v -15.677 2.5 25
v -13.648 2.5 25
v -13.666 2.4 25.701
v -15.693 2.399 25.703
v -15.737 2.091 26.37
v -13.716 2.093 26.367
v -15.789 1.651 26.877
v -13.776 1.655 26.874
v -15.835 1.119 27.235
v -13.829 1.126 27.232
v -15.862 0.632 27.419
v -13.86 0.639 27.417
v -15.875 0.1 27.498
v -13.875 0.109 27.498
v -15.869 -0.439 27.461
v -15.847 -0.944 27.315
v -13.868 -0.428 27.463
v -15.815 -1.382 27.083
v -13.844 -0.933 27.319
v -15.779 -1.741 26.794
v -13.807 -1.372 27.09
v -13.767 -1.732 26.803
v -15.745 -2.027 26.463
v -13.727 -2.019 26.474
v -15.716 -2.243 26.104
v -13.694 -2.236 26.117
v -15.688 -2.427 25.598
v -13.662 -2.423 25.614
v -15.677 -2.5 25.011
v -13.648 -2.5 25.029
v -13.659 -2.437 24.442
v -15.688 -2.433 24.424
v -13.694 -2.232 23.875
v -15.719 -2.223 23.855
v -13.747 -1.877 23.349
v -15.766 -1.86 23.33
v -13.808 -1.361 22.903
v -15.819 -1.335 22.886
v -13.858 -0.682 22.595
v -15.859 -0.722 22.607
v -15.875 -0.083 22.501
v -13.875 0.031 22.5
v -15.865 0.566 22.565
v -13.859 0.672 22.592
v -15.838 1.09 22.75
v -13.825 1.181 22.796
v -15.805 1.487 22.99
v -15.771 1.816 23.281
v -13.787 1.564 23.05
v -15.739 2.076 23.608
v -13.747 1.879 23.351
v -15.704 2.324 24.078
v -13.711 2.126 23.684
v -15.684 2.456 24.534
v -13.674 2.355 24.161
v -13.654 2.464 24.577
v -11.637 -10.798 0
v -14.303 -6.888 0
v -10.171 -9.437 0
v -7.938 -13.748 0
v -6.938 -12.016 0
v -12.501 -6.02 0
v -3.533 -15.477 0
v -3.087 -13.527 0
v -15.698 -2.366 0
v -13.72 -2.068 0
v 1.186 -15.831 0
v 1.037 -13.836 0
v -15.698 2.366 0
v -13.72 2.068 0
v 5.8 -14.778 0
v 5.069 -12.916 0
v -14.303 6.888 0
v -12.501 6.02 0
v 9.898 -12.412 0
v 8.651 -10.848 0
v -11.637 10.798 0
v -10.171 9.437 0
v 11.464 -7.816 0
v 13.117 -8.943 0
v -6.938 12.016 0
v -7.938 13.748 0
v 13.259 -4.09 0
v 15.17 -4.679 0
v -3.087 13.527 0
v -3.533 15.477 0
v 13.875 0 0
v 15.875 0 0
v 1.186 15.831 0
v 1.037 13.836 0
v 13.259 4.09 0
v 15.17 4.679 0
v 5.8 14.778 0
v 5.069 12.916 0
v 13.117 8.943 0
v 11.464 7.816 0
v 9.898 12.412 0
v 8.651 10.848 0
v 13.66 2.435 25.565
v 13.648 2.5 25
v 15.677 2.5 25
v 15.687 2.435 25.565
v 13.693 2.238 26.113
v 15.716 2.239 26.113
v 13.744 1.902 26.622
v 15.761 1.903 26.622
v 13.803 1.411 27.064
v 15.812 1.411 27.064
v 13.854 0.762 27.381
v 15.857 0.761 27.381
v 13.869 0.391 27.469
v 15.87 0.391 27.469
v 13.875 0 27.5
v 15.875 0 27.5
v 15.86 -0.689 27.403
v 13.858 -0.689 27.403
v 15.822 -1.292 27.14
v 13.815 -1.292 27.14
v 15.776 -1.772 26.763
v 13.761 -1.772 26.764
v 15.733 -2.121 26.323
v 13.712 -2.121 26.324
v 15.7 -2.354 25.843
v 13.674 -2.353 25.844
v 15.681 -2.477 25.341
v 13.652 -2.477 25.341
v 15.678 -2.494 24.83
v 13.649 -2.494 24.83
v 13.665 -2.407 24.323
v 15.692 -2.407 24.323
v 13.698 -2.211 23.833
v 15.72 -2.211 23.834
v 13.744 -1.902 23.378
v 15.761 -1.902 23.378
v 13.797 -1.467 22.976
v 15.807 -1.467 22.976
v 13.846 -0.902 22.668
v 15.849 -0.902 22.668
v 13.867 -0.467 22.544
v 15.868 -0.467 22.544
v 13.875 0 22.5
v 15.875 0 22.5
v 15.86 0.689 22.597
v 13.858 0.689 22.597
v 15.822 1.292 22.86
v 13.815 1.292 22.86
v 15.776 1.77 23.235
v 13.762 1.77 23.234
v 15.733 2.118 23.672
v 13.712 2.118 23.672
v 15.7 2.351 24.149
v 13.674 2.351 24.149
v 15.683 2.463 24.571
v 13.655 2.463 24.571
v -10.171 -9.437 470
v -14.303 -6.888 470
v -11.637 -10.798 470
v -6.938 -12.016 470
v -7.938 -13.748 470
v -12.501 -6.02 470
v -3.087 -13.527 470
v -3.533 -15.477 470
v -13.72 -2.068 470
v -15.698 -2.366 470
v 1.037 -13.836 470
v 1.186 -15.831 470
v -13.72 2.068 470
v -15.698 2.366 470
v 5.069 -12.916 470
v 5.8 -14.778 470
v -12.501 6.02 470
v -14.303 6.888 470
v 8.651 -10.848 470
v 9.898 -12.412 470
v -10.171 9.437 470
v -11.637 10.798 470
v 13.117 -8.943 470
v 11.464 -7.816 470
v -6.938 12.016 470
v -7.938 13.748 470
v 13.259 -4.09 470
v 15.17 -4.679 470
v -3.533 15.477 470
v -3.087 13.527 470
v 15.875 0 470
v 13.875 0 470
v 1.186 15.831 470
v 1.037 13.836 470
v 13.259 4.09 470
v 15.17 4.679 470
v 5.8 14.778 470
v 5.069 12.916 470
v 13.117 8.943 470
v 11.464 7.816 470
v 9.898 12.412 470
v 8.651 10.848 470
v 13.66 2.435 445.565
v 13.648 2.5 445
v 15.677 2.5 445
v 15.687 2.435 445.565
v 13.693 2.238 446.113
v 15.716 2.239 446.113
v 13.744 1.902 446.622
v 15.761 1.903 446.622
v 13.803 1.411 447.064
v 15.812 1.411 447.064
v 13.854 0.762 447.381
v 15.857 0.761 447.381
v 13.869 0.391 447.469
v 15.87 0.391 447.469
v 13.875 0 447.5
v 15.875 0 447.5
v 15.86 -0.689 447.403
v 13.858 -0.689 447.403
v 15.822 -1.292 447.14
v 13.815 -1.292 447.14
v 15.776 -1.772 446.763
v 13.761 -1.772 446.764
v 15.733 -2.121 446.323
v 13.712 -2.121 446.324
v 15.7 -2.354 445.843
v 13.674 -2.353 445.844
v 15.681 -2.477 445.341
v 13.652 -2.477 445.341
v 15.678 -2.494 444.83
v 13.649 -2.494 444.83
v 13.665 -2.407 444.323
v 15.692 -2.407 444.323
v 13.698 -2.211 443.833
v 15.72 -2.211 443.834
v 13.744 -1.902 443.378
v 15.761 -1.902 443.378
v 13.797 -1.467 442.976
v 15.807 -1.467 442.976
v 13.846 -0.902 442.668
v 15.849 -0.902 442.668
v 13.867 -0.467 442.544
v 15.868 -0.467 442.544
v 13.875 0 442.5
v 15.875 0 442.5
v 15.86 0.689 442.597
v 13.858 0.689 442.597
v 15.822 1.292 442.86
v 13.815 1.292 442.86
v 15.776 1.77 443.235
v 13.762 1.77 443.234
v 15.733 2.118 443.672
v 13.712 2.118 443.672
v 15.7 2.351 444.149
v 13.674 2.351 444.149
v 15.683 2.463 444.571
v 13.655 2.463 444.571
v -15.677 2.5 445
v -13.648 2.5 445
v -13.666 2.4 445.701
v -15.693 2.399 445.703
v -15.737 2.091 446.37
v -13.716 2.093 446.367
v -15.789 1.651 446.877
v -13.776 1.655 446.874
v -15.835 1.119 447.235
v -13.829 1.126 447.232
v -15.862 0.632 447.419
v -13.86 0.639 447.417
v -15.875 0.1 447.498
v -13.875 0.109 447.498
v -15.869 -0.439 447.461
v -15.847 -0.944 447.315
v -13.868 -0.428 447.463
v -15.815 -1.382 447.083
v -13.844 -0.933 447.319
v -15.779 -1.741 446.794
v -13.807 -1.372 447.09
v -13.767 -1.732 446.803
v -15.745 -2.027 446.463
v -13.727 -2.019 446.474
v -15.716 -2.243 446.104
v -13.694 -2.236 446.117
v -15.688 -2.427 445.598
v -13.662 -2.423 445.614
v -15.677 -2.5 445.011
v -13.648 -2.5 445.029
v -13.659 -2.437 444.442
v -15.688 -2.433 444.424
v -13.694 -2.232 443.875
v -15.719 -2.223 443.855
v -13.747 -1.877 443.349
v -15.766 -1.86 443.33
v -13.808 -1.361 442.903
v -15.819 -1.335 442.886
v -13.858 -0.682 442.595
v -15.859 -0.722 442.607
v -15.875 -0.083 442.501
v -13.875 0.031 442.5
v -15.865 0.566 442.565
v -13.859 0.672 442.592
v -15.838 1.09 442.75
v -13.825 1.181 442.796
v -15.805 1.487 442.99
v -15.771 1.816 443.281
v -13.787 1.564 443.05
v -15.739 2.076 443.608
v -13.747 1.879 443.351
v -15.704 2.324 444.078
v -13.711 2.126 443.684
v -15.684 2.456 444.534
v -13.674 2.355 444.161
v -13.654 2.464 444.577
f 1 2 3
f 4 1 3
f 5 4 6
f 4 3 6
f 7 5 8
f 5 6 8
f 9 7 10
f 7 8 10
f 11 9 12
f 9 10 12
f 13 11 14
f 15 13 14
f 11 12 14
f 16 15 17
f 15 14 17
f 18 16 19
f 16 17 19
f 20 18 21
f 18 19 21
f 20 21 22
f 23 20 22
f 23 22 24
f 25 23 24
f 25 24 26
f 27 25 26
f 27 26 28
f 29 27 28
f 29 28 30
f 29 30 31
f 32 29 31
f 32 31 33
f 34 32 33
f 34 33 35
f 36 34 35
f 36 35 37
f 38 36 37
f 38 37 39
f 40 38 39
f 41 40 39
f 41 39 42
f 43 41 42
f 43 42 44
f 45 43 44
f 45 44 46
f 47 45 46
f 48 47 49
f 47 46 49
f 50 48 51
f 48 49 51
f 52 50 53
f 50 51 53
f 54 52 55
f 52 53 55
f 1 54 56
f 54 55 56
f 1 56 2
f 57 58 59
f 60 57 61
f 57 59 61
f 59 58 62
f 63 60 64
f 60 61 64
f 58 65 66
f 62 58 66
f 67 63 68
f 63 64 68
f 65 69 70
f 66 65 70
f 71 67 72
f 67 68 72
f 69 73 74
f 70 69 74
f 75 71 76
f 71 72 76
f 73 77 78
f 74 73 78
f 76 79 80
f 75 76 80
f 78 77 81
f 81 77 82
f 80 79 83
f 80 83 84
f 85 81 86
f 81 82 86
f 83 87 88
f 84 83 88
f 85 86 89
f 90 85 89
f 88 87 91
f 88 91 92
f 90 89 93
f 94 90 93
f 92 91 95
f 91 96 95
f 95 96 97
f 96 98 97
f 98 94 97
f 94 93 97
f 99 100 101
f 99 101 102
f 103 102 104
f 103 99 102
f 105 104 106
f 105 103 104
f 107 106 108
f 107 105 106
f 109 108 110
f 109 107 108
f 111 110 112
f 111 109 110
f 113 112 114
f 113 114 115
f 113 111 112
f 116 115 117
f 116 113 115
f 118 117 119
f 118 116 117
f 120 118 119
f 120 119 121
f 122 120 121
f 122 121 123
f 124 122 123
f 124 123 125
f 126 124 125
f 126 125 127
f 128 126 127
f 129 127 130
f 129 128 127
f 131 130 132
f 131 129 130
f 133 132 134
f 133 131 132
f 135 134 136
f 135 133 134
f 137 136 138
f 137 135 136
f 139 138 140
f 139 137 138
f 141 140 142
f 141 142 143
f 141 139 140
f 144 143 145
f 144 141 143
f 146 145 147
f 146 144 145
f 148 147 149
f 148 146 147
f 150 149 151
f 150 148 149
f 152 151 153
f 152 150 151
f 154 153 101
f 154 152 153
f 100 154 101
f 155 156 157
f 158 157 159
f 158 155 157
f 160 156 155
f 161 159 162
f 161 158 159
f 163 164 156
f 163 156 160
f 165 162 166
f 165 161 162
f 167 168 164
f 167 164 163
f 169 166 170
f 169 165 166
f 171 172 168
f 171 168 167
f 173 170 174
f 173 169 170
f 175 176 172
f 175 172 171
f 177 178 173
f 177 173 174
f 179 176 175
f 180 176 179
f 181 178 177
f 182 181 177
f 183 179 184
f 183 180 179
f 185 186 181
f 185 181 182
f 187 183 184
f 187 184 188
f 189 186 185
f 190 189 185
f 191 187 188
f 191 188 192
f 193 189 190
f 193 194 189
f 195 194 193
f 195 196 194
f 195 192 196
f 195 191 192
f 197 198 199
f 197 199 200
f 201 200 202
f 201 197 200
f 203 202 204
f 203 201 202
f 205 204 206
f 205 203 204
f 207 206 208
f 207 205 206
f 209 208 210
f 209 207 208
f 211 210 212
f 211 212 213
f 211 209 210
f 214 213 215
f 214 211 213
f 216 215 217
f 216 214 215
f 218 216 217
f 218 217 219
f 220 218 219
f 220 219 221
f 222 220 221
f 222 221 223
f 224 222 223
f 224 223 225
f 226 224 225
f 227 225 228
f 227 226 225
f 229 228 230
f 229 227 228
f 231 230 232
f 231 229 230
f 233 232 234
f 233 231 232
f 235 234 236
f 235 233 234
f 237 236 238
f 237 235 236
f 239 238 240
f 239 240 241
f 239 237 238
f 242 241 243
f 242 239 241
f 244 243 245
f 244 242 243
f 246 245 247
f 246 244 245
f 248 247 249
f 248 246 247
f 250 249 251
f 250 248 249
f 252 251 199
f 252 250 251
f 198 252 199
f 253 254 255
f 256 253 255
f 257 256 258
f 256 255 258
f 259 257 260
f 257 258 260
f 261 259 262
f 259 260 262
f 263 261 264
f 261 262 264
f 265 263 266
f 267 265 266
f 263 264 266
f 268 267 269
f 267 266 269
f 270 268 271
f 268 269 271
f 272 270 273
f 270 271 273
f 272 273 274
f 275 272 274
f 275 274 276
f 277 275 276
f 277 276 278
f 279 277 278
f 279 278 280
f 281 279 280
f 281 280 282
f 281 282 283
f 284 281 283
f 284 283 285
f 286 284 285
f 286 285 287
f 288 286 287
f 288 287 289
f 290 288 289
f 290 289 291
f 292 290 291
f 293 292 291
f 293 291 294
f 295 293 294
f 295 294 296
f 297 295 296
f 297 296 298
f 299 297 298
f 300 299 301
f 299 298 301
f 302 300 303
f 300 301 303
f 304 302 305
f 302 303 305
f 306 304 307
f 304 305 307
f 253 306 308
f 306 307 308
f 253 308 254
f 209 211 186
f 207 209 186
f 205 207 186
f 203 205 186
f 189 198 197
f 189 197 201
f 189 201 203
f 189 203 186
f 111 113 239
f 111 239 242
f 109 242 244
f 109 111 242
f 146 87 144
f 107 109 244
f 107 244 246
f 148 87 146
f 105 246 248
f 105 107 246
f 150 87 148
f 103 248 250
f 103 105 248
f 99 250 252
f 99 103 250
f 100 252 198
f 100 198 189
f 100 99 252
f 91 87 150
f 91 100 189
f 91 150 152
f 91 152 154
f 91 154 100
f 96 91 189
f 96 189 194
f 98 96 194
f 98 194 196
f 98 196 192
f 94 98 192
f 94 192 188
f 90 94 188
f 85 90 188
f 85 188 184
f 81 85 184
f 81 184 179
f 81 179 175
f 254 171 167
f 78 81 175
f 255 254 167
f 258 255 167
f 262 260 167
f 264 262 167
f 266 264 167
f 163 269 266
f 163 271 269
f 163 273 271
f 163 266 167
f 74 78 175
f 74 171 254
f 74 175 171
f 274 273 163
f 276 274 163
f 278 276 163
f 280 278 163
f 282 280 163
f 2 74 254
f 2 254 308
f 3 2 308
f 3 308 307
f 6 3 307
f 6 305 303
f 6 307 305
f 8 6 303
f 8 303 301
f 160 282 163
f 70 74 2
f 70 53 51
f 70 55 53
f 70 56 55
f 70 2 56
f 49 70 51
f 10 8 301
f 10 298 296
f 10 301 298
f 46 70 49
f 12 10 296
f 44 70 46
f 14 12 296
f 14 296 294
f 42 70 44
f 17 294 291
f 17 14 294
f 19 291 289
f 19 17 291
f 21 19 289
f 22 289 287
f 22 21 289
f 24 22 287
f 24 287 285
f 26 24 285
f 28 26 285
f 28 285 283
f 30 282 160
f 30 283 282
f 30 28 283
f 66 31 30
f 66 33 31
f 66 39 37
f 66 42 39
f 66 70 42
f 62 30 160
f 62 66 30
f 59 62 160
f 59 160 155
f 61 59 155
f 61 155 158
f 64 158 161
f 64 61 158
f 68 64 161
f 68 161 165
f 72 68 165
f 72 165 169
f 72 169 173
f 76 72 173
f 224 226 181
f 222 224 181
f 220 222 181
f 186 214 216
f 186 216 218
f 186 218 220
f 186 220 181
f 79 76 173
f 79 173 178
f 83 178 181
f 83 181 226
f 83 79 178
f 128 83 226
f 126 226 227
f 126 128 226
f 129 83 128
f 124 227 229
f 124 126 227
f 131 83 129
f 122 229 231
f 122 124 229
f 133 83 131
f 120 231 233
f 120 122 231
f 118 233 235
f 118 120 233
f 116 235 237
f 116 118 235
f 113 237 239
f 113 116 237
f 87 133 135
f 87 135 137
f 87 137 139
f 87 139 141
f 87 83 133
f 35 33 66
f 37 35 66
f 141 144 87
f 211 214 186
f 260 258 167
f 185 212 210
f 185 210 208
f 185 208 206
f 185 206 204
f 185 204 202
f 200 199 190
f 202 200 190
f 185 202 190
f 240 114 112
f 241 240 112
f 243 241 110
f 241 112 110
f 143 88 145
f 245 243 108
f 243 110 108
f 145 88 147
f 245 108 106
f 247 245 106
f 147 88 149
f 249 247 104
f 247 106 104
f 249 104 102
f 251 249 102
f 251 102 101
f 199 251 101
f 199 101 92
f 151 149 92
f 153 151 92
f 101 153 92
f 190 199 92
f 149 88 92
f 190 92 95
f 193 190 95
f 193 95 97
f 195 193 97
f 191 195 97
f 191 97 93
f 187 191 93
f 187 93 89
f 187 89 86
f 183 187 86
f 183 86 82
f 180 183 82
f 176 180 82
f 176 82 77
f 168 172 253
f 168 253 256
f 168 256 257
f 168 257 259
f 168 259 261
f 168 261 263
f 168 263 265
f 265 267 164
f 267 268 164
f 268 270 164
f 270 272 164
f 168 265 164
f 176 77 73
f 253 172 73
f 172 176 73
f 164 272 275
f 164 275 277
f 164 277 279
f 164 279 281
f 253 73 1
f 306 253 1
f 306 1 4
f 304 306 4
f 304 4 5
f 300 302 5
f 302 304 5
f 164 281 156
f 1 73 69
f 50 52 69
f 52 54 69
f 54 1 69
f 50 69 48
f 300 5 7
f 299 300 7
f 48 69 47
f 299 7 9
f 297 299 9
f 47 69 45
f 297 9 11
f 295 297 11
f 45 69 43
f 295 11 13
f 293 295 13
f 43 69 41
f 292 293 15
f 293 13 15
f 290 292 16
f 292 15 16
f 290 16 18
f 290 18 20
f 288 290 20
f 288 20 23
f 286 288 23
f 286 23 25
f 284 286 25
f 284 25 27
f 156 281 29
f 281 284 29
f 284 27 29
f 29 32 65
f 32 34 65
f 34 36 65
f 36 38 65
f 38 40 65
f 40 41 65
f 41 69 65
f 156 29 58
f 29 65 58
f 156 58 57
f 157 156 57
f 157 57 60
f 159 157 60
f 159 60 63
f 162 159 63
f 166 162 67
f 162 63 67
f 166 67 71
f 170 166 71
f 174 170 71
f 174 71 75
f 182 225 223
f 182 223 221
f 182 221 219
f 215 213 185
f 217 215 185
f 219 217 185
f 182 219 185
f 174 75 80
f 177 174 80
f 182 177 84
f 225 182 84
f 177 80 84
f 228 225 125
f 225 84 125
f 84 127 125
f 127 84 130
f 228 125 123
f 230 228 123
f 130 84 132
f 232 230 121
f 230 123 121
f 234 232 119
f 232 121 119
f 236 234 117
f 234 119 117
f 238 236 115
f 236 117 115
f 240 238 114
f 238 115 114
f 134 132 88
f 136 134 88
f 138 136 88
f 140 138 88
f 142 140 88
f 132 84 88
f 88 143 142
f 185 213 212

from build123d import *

# Parameters (mm, degrees)
F0_R          = 15.875
F0_R_2        = 13.875
F1_DEPTH      = 470
F2_R          = 2.5
F3_DEPTH      = 30
F3_DEPTH_BACK = 30
F4_R          = 2.5
F5_DEPTH      = 25
F5_DEPTH_BACK = 25


with BuildPart() as f1:
    # F0 (on Top) → F1 (new body)
    with BuildSketch(Plane.XY):
        Circle(F0_R)
        Circle(F0_R_2, mode=Mode.SUBTRACT)
    extrude(amount=F1_DEPTH)

    # F2 (on Right) → F3 (cut, two sides)
    with BuildSketch(Plane.YZ) as f3_sk:
        with Locations((0, 25)):
            Circle(F2_R)
    extrude(amount=F3_DEPTH, mode=Mode.SUBTRACT)
    extrude(f3_sk.sketch, amount=-F3_DEPTH_BACK, mode=Mode.SUBTRACT)

    # F4 (on Right) → F5 (cut, two sides)
    with BuildSketch(Plane.YZ) as f5_sk:
        with Locations((0, 445)):
            Circle(F4_R)
    extrude(amount=-F5_DEPTH, mode=Mode.SUBTRACT)
    extrude(f5_sk.sketch, amount=F5_DEPTH_BACK, mode=Mode.SUBTRACT)


solid = f1.part
